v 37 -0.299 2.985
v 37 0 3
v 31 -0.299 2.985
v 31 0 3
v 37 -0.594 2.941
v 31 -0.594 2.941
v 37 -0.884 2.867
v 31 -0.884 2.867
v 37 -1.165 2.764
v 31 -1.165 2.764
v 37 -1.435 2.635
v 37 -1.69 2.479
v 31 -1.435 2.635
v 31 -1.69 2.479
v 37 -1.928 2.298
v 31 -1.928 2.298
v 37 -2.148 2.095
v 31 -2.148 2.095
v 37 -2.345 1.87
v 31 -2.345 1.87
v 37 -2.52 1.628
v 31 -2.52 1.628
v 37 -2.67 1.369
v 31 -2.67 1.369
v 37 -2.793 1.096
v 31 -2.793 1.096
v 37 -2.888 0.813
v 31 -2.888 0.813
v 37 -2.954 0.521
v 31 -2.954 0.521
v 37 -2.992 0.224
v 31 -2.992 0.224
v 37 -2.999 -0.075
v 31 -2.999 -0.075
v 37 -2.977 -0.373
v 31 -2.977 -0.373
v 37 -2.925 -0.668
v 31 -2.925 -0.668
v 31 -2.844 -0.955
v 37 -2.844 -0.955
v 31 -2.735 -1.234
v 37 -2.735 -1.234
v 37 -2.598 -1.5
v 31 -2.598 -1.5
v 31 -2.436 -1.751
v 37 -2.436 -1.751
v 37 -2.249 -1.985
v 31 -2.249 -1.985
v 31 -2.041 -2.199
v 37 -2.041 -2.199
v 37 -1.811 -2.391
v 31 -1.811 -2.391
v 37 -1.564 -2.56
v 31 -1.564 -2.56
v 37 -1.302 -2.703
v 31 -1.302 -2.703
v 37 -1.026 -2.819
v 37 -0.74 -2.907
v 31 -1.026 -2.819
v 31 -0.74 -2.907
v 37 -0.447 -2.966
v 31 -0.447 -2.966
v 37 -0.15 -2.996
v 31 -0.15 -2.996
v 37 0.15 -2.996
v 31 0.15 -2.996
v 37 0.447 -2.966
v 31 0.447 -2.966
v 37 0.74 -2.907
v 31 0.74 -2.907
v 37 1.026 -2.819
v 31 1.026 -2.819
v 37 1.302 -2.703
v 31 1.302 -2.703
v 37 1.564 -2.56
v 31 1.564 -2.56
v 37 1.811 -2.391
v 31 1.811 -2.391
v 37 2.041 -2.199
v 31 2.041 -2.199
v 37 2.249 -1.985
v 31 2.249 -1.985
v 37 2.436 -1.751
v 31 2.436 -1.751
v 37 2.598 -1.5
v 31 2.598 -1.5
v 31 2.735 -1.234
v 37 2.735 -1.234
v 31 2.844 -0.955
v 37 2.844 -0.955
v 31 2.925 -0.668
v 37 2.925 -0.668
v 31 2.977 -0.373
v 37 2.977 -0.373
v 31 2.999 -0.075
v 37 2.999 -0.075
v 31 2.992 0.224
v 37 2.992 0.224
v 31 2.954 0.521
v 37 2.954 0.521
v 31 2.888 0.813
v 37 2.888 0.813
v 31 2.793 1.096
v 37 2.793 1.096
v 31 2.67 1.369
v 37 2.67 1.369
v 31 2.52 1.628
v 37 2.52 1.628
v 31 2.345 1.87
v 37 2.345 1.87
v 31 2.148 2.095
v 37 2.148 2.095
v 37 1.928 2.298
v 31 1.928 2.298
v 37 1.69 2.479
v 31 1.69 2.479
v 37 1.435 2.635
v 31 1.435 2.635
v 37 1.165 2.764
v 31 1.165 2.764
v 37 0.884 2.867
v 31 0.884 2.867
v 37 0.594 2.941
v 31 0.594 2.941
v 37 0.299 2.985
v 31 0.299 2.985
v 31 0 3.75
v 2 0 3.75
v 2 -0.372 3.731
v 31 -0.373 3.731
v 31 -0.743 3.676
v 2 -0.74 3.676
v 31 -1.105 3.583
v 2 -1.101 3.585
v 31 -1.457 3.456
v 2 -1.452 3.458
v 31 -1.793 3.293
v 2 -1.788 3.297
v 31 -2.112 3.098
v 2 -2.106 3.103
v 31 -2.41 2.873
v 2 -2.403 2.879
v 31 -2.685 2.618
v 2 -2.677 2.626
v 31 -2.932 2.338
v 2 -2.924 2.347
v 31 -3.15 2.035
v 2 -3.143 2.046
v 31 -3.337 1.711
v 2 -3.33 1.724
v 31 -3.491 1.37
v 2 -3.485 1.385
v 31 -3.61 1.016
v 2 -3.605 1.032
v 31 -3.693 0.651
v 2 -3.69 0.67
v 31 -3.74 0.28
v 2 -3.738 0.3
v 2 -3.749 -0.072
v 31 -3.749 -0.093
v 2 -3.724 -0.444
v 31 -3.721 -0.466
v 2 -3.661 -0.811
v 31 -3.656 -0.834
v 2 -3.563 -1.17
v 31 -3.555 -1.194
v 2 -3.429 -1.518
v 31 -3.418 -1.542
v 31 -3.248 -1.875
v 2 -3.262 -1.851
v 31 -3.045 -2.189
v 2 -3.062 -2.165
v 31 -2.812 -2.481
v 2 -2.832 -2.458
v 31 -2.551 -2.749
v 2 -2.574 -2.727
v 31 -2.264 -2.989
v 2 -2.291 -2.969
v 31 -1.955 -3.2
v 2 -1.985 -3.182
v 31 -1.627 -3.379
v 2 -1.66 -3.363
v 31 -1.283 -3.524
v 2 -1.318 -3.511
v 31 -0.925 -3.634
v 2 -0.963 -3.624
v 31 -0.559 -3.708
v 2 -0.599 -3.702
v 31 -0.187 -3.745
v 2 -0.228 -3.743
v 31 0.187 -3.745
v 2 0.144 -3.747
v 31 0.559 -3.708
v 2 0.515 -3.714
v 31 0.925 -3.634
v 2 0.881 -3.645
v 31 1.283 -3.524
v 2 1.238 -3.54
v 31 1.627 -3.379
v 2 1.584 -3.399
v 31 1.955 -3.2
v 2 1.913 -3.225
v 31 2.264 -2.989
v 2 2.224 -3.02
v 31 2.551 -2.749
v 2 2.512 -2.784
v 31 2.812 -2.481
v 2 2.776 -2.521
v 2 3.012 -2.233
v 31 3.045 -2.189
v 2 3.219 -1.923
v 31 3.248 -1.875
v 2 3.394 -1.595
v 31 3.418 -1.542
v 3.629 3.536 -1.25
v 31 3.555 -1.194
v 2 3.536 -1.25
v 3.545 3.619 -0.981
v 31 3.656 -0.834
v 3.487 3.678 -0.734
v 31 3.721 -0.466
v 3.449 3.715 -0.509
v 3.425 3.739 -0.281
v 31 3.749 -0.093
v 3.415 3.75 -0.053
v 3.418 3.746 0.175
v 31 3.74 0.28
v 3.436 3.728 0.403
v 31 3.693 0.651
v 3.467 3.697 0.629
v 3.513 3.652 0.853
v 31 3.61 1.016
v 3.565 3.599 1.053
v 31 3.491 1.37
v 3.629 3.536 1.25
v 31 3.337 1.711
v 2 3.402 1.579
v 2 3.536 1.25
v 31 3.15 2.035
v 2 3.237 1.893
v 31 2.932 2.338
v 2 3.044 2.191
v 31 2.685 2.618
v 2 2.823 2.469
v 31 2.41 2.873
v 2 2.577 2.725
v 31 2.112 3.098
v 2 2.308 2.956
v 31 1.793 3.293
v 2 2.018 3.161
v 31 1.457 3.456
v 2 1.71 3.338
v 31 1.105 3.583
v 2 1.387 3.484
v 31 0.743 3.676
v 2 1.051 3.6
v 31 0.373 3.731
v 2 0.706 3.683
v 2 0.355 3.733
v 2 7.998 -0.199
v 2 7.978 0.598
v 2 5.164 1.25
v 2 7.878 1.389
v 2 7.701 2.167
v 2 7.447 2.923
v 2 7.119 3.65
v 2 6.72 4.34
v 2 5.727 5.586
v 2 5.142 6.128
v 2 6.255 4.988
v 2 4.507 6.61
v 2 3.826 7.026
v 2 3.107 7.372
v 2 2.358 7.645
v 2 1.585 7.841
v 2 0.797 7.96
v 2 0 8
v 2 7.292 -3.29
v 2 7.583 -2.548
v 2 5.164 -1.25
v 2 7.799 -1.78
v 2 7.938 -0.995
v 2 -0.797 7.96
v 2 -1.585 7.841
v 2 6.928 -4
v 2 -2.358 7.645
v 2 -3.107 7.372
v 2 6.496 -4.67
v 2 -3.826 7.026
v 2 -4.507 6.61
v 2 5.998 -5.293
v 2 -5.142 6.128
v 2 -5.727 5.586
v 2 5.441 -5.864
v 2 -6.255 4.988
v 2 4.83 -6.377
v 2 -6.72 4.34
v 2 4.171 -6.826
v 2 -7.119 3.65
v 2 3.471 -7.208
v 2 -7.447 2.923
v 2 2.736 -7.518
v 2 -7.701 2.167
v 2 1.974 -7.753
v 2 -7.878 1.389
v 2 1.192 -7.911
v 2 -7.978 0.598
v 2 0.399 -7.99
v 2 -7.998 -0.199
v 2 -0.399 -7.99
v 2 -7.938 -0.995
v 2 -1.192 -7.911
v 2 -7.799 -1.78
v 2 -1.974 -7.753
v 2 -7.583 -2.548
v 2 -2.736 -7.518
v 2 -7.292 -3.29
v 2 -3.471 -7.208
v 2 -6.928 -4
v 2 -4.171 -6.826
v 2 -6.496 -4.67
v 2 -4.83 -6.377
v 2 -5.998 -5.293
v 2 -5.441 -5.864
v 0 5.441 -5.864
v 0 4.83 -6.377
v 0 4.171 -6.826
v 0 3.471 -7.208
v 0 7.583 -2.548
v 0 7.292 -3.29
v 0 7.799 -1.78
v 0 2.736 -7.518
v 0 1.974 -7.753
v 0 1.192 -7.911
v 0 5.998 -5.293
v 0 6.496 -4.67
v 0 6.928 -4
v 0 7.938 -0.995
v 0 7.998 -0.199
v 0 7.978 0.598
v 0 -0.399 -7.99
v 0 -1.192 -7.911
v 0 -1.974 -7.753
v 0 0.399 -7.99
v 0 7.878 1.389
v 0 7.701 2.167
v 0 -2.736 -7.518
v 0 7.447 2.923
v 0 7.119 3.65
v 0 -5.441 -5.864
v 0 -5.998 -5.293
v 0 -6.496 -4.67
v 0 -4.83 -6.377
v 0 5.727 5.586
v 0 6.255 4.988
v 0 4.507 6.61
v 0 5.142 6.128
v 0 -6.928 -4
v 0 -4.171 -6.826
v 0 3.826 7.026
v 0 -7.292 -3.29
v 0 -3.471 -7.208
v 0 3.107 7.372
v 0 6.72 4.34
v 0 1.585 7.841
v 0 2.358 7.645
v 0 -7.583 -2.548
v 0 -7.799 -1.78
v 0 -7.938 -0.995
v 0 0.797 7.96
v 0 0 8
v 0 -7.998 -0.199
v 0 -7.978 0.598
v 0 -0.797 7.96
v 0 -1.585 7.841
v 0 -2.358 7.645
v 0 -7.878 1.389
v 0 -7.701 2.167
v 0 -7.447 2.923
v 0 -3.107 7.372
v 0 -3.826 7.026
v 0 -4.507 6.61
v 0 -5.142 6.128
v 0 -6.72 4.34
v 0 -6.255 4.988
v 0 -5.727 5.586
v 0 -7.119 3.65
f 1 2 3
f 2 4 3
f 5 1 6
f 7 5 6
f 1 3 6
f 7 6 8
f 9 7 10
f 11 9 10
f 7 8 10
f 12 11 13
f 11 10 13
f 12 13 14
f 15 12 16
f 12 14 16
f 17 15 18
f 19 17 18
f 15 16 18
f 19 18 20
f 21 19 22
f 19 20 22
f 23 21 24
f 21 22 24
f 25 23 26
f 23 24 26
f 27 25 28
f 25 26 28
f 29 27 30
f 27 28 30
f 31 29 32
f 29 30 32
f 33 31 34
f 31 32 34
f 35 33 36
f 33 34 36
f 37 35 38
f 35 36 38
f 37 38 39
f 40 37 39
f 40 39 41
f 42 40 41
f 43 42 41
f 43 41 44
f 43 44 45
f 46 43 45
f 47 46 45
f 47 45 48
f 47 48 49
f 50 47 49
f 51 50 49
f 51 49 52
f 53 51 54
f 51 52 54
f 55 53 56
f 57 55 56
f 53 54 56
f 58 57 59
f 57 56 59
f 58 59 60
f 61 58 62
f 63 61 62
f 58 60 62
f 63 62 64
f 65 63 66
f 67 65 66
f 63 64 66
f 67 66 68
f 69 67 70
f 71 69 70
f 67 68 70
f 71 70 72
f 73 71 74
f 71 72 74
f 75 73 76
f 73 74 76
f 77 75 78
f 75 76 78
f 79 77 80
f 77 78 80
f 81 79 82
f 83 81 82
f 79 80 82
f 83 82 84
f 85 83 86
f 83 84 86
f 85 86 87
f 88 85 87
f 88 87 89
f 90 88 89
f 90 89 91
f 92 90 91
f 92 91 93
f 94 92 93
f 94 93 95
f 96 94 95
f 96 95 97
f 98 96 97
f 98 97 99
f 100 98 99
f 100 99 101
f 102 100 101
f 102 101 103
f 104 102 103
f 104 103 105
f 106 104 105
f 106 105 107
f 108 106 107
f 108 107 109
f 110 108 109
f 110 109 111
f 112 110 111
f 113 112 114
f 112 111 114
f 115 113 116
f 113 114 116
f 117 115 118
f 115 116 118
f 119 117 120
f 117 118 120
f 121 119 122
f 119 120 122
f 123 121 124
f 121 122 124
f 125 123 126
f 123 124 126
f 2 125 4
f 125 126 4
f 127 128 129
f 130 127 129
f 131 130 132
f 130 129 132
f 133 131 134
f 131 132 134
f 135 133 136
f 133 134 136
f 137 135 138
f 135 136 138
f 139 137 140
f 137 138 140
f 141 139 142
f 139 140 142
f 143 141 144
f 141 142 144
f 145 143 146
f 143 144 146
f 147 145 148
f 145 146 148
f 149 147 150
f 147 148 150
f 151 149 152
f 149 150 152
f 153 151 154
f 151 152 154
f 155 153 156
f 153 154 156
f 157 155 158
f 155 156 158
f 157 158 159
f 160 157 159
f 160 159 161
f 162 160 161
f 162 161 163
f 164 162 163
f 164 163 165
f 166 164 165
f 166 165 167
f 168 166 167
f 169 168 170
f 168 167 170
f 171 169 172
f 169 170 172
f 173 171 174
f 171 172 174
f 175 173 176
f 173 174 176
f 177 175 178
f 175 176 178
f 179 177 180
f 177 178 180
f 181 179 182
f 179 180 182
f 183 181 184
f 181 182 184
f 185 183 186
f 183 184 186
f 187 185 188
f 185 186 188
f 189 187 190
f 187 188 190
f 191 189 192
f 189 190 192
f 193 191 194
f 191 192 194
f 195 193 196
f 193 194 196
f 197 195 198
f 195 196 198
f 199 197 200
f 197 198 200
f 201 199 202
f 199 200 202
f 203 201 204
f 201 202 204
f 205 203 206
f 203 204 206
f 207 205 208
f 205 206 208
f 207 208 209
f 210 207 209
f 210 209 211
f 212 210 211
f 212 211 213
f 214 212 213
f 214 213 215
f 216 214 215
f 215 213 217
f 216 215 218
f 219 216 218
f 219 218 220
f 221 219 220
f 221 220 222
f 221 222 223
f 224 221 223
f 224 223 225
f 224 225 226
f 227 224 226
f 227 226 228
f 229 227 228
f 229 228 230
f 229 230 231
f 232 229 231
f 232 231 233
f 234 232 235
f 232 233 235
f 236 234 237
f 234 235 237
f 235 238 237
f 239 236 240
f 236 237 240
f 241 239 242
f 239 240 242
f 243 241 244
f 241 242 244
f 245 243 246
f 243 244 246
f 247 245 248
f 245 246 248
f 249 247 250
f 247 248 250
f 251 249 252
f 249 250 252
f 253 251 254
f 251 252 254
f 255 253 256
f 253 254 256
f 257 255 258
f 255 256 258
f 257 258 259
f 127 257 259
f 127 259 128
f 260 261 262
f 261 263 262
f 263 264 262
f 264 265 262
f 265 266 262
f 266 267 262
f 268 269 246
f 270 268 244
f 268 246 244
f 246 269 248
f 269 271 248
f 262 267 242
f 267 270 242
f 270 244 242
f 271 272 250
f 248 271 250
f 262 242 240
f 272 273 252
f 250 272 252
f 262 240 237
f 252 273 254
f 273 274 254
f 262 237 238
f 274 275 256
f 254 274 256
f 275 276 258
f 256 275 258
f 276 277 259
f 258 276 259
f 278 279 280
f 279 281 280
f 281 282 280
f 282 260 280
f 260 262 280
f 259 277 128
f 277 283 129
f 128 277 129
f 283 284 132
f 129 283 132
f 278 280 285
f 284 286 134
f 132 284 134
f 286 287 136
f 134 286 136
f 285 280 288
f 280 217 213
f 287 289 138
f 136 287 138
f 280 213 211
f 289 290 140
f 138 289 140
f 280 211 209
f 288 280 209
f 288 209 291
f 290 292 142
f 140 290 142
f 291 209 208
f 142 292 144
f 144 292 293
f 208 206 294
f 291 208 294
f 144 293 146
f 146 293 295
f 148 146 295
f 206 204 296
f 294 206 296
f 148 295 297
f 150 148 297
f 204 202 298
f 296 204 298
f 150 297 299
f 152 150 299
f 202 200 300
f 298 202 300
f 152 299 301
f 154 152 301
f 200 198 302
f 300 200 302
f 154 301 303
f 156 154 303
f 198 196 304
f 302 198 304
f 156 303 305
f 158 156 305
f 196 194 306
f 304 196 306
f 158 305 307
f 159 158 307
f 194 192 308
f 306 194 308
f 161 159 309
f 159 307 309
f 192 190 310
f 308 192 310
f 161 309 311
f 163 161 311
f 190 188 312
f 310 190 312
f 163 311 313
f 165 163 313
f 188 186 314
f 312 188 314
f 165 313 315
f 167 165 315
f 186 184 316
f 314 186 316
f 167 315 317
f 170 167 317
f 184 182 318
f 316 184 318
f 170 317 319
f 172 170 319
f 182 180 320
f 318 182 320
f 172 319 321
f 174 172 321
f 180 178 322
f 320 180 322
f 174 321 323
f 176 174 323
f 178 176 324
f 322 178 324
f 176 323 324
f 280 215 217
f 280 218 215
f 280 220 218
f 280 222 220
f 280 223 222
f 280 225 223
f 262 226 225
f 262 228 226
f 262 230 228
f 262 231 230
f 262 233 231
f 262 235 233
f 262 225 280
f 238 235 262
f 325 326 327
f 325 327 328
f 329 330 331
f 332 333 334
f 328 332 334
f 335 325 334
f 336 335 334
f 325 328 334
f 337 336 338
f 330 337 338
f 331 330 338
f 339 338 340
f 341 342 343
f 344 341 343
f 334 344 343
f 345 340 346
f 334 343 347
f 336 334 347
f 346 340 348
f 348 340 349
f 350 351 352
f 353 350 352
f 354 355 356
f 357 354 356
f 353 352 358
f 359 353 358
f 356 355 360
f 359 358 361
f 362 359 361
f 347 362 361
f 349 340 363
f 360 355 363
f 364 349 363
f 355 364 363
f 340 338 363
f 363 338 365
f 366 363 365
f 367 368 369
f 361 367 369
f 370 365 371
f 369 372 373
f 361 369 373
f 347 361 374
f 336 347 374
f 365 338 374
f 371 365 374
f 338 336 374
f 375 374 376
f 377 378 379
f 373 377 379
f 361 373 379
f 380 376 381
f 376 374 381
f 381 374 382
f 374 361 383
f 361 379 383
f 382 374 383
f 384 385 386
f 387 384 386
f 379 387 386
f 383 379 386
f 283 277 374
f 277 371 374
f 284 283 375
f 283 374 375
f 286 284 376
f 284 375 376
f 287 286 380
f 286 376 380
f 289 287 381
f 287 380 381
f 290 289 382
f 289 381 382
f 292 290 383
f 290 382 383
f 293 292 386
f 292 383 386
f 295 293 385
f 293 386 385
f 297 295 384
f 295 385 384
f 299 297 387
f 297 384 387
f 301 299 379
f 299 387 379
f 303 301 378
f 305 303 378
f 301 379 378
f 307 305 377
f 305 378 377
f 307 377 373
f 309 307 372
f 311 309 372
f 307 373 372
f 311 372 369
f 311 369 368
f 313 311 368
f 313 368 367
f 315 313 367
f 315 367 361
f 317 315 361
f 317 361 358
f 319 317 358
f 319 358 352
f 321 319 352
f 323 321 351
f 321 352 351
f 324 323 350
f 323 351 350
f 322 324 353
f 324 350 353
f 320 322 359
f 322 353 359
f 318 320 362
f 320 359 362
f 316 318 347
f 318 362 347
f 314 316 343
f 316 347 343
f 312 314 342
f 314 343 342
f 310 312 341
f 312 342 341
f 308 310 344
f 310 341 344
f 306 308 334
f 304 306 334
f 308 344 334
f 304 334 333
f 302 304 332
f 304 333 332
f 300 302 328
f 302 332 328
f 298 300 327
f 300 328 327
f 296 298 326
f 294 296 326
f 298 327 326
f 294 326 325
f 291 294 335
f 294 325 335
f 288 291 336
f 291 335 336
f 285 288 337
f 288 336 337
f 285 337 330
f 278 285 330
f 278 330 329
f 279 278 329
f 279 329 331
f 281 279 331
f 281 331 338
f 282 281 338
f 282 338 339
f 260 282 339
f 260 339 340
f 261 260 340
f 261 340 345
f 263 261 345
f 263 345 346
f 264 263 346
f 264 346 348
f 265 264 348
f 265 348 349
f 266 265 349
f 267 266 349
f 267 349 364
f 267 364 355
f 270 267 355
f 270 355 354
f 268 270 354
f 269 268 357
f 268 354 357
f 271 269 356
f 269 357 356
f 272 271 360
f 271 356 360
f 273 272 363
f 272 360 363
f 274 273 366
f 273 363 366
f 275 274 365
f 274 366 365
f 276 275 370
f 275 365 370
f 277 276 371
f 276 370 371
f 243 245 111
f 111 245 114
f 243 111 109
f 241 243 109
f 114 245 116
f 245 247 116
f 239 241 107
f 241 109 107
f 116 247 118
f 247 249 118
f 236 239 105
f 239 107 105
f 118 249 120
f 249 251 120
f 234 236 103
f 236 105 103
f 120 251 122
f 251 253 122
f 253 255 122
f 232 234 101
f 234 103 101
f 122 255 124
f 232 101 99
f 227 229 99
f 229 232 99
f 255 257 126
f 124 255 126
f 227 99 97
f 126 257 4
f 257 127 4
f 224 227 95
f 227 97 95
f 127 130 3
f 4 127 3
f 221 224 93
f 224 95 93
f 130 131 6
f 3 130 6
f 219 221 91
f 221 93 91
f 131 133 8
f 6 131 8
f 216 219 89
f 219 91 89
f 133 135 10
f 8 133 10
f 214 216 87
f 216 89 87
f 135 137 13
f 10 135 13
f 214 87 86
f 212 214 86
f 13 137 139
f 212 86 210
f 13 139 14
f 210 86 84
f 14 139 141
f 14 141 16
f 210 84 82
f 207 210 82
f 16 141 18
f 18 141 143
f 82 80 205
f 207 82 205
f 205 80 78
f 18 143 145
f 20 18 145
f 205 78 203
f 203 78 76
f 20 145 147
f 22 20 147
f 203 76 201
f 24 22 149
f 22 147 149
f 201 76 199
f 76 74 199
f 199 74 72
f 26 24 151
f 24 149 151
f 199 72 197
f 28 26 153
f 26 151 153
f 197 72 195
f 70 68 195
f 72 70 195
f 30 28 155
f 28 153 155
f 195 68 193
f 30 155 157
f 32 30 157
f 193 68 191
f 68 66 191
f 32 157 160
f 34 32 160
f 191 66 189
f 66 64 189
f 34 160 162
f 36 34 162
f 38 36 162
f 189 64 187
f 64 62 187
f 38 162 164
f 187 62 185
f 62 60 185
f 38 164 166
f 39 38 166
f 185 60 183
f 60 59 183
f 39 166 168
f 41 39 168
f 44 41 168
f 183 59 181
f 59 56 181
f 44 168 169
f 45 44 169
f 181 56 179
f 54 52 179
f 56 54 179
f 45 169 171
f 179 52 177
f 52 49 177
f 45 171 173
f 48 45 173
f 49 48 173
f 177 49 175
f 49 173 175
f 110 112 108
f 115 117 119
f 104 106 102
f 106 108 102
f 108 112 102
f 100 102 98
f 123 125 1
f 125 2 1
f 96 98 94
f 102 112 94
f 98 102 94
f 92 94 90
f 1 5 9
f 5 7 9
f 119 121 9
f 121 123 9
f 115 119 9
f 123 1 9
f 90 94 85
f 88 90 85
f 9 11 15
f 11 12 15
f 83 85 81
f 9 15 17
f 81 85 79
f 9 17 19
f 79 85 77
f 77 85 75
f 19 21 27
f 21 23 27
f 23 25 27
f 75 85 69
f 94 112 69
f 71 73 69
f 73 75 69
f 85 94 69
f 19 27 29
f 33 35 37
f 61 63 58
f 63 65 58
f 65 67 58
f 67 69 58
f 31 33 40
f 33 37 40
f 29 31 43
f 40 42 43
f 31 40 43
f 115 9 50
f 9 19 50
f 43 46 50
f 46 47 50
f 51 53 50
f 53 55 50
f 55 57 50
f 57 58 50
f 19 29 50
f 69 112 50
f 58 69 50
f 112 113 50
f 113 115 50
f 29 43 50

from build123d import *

# Parameters (mm, degrees)
SALIENTE_EXTRUIR1_DEPTH = 1.25


with BuildPart() as part:
    # Croquis1 → Revolución1 (revolve)
    with BuildSketch(Plane.XY, mode=Mode.PRIVATE) as revoluci_n1_sk:
        Polygon((0, 0), (37, 0), (37, 3), (31, 3), (31, 3.75), (2, 3.75), (2, 8), (0, 8), align=None)
    revolve(revoluci_n1_sk.sketch.rotate(Axis((0, 0, 0), (1, 0, 0)), 90), axis=Axis((0, 0, 0), (1, 0, 0)))

    # Croquis2 → Saliente-Extruir1 (add, symmetric)
    with BuildSketch(Plane.XY):
        Polygon((2, 5.164213562), (3.414213562, 3.75), (5.426219931, 1.737993631), (0.712521071, 1.737993631), (0.712521071, 6.451692492), align=None)
    extrude(amount=SALIENTE_EXTRUIR1_DEPTH, both=True)


solid = part.part
